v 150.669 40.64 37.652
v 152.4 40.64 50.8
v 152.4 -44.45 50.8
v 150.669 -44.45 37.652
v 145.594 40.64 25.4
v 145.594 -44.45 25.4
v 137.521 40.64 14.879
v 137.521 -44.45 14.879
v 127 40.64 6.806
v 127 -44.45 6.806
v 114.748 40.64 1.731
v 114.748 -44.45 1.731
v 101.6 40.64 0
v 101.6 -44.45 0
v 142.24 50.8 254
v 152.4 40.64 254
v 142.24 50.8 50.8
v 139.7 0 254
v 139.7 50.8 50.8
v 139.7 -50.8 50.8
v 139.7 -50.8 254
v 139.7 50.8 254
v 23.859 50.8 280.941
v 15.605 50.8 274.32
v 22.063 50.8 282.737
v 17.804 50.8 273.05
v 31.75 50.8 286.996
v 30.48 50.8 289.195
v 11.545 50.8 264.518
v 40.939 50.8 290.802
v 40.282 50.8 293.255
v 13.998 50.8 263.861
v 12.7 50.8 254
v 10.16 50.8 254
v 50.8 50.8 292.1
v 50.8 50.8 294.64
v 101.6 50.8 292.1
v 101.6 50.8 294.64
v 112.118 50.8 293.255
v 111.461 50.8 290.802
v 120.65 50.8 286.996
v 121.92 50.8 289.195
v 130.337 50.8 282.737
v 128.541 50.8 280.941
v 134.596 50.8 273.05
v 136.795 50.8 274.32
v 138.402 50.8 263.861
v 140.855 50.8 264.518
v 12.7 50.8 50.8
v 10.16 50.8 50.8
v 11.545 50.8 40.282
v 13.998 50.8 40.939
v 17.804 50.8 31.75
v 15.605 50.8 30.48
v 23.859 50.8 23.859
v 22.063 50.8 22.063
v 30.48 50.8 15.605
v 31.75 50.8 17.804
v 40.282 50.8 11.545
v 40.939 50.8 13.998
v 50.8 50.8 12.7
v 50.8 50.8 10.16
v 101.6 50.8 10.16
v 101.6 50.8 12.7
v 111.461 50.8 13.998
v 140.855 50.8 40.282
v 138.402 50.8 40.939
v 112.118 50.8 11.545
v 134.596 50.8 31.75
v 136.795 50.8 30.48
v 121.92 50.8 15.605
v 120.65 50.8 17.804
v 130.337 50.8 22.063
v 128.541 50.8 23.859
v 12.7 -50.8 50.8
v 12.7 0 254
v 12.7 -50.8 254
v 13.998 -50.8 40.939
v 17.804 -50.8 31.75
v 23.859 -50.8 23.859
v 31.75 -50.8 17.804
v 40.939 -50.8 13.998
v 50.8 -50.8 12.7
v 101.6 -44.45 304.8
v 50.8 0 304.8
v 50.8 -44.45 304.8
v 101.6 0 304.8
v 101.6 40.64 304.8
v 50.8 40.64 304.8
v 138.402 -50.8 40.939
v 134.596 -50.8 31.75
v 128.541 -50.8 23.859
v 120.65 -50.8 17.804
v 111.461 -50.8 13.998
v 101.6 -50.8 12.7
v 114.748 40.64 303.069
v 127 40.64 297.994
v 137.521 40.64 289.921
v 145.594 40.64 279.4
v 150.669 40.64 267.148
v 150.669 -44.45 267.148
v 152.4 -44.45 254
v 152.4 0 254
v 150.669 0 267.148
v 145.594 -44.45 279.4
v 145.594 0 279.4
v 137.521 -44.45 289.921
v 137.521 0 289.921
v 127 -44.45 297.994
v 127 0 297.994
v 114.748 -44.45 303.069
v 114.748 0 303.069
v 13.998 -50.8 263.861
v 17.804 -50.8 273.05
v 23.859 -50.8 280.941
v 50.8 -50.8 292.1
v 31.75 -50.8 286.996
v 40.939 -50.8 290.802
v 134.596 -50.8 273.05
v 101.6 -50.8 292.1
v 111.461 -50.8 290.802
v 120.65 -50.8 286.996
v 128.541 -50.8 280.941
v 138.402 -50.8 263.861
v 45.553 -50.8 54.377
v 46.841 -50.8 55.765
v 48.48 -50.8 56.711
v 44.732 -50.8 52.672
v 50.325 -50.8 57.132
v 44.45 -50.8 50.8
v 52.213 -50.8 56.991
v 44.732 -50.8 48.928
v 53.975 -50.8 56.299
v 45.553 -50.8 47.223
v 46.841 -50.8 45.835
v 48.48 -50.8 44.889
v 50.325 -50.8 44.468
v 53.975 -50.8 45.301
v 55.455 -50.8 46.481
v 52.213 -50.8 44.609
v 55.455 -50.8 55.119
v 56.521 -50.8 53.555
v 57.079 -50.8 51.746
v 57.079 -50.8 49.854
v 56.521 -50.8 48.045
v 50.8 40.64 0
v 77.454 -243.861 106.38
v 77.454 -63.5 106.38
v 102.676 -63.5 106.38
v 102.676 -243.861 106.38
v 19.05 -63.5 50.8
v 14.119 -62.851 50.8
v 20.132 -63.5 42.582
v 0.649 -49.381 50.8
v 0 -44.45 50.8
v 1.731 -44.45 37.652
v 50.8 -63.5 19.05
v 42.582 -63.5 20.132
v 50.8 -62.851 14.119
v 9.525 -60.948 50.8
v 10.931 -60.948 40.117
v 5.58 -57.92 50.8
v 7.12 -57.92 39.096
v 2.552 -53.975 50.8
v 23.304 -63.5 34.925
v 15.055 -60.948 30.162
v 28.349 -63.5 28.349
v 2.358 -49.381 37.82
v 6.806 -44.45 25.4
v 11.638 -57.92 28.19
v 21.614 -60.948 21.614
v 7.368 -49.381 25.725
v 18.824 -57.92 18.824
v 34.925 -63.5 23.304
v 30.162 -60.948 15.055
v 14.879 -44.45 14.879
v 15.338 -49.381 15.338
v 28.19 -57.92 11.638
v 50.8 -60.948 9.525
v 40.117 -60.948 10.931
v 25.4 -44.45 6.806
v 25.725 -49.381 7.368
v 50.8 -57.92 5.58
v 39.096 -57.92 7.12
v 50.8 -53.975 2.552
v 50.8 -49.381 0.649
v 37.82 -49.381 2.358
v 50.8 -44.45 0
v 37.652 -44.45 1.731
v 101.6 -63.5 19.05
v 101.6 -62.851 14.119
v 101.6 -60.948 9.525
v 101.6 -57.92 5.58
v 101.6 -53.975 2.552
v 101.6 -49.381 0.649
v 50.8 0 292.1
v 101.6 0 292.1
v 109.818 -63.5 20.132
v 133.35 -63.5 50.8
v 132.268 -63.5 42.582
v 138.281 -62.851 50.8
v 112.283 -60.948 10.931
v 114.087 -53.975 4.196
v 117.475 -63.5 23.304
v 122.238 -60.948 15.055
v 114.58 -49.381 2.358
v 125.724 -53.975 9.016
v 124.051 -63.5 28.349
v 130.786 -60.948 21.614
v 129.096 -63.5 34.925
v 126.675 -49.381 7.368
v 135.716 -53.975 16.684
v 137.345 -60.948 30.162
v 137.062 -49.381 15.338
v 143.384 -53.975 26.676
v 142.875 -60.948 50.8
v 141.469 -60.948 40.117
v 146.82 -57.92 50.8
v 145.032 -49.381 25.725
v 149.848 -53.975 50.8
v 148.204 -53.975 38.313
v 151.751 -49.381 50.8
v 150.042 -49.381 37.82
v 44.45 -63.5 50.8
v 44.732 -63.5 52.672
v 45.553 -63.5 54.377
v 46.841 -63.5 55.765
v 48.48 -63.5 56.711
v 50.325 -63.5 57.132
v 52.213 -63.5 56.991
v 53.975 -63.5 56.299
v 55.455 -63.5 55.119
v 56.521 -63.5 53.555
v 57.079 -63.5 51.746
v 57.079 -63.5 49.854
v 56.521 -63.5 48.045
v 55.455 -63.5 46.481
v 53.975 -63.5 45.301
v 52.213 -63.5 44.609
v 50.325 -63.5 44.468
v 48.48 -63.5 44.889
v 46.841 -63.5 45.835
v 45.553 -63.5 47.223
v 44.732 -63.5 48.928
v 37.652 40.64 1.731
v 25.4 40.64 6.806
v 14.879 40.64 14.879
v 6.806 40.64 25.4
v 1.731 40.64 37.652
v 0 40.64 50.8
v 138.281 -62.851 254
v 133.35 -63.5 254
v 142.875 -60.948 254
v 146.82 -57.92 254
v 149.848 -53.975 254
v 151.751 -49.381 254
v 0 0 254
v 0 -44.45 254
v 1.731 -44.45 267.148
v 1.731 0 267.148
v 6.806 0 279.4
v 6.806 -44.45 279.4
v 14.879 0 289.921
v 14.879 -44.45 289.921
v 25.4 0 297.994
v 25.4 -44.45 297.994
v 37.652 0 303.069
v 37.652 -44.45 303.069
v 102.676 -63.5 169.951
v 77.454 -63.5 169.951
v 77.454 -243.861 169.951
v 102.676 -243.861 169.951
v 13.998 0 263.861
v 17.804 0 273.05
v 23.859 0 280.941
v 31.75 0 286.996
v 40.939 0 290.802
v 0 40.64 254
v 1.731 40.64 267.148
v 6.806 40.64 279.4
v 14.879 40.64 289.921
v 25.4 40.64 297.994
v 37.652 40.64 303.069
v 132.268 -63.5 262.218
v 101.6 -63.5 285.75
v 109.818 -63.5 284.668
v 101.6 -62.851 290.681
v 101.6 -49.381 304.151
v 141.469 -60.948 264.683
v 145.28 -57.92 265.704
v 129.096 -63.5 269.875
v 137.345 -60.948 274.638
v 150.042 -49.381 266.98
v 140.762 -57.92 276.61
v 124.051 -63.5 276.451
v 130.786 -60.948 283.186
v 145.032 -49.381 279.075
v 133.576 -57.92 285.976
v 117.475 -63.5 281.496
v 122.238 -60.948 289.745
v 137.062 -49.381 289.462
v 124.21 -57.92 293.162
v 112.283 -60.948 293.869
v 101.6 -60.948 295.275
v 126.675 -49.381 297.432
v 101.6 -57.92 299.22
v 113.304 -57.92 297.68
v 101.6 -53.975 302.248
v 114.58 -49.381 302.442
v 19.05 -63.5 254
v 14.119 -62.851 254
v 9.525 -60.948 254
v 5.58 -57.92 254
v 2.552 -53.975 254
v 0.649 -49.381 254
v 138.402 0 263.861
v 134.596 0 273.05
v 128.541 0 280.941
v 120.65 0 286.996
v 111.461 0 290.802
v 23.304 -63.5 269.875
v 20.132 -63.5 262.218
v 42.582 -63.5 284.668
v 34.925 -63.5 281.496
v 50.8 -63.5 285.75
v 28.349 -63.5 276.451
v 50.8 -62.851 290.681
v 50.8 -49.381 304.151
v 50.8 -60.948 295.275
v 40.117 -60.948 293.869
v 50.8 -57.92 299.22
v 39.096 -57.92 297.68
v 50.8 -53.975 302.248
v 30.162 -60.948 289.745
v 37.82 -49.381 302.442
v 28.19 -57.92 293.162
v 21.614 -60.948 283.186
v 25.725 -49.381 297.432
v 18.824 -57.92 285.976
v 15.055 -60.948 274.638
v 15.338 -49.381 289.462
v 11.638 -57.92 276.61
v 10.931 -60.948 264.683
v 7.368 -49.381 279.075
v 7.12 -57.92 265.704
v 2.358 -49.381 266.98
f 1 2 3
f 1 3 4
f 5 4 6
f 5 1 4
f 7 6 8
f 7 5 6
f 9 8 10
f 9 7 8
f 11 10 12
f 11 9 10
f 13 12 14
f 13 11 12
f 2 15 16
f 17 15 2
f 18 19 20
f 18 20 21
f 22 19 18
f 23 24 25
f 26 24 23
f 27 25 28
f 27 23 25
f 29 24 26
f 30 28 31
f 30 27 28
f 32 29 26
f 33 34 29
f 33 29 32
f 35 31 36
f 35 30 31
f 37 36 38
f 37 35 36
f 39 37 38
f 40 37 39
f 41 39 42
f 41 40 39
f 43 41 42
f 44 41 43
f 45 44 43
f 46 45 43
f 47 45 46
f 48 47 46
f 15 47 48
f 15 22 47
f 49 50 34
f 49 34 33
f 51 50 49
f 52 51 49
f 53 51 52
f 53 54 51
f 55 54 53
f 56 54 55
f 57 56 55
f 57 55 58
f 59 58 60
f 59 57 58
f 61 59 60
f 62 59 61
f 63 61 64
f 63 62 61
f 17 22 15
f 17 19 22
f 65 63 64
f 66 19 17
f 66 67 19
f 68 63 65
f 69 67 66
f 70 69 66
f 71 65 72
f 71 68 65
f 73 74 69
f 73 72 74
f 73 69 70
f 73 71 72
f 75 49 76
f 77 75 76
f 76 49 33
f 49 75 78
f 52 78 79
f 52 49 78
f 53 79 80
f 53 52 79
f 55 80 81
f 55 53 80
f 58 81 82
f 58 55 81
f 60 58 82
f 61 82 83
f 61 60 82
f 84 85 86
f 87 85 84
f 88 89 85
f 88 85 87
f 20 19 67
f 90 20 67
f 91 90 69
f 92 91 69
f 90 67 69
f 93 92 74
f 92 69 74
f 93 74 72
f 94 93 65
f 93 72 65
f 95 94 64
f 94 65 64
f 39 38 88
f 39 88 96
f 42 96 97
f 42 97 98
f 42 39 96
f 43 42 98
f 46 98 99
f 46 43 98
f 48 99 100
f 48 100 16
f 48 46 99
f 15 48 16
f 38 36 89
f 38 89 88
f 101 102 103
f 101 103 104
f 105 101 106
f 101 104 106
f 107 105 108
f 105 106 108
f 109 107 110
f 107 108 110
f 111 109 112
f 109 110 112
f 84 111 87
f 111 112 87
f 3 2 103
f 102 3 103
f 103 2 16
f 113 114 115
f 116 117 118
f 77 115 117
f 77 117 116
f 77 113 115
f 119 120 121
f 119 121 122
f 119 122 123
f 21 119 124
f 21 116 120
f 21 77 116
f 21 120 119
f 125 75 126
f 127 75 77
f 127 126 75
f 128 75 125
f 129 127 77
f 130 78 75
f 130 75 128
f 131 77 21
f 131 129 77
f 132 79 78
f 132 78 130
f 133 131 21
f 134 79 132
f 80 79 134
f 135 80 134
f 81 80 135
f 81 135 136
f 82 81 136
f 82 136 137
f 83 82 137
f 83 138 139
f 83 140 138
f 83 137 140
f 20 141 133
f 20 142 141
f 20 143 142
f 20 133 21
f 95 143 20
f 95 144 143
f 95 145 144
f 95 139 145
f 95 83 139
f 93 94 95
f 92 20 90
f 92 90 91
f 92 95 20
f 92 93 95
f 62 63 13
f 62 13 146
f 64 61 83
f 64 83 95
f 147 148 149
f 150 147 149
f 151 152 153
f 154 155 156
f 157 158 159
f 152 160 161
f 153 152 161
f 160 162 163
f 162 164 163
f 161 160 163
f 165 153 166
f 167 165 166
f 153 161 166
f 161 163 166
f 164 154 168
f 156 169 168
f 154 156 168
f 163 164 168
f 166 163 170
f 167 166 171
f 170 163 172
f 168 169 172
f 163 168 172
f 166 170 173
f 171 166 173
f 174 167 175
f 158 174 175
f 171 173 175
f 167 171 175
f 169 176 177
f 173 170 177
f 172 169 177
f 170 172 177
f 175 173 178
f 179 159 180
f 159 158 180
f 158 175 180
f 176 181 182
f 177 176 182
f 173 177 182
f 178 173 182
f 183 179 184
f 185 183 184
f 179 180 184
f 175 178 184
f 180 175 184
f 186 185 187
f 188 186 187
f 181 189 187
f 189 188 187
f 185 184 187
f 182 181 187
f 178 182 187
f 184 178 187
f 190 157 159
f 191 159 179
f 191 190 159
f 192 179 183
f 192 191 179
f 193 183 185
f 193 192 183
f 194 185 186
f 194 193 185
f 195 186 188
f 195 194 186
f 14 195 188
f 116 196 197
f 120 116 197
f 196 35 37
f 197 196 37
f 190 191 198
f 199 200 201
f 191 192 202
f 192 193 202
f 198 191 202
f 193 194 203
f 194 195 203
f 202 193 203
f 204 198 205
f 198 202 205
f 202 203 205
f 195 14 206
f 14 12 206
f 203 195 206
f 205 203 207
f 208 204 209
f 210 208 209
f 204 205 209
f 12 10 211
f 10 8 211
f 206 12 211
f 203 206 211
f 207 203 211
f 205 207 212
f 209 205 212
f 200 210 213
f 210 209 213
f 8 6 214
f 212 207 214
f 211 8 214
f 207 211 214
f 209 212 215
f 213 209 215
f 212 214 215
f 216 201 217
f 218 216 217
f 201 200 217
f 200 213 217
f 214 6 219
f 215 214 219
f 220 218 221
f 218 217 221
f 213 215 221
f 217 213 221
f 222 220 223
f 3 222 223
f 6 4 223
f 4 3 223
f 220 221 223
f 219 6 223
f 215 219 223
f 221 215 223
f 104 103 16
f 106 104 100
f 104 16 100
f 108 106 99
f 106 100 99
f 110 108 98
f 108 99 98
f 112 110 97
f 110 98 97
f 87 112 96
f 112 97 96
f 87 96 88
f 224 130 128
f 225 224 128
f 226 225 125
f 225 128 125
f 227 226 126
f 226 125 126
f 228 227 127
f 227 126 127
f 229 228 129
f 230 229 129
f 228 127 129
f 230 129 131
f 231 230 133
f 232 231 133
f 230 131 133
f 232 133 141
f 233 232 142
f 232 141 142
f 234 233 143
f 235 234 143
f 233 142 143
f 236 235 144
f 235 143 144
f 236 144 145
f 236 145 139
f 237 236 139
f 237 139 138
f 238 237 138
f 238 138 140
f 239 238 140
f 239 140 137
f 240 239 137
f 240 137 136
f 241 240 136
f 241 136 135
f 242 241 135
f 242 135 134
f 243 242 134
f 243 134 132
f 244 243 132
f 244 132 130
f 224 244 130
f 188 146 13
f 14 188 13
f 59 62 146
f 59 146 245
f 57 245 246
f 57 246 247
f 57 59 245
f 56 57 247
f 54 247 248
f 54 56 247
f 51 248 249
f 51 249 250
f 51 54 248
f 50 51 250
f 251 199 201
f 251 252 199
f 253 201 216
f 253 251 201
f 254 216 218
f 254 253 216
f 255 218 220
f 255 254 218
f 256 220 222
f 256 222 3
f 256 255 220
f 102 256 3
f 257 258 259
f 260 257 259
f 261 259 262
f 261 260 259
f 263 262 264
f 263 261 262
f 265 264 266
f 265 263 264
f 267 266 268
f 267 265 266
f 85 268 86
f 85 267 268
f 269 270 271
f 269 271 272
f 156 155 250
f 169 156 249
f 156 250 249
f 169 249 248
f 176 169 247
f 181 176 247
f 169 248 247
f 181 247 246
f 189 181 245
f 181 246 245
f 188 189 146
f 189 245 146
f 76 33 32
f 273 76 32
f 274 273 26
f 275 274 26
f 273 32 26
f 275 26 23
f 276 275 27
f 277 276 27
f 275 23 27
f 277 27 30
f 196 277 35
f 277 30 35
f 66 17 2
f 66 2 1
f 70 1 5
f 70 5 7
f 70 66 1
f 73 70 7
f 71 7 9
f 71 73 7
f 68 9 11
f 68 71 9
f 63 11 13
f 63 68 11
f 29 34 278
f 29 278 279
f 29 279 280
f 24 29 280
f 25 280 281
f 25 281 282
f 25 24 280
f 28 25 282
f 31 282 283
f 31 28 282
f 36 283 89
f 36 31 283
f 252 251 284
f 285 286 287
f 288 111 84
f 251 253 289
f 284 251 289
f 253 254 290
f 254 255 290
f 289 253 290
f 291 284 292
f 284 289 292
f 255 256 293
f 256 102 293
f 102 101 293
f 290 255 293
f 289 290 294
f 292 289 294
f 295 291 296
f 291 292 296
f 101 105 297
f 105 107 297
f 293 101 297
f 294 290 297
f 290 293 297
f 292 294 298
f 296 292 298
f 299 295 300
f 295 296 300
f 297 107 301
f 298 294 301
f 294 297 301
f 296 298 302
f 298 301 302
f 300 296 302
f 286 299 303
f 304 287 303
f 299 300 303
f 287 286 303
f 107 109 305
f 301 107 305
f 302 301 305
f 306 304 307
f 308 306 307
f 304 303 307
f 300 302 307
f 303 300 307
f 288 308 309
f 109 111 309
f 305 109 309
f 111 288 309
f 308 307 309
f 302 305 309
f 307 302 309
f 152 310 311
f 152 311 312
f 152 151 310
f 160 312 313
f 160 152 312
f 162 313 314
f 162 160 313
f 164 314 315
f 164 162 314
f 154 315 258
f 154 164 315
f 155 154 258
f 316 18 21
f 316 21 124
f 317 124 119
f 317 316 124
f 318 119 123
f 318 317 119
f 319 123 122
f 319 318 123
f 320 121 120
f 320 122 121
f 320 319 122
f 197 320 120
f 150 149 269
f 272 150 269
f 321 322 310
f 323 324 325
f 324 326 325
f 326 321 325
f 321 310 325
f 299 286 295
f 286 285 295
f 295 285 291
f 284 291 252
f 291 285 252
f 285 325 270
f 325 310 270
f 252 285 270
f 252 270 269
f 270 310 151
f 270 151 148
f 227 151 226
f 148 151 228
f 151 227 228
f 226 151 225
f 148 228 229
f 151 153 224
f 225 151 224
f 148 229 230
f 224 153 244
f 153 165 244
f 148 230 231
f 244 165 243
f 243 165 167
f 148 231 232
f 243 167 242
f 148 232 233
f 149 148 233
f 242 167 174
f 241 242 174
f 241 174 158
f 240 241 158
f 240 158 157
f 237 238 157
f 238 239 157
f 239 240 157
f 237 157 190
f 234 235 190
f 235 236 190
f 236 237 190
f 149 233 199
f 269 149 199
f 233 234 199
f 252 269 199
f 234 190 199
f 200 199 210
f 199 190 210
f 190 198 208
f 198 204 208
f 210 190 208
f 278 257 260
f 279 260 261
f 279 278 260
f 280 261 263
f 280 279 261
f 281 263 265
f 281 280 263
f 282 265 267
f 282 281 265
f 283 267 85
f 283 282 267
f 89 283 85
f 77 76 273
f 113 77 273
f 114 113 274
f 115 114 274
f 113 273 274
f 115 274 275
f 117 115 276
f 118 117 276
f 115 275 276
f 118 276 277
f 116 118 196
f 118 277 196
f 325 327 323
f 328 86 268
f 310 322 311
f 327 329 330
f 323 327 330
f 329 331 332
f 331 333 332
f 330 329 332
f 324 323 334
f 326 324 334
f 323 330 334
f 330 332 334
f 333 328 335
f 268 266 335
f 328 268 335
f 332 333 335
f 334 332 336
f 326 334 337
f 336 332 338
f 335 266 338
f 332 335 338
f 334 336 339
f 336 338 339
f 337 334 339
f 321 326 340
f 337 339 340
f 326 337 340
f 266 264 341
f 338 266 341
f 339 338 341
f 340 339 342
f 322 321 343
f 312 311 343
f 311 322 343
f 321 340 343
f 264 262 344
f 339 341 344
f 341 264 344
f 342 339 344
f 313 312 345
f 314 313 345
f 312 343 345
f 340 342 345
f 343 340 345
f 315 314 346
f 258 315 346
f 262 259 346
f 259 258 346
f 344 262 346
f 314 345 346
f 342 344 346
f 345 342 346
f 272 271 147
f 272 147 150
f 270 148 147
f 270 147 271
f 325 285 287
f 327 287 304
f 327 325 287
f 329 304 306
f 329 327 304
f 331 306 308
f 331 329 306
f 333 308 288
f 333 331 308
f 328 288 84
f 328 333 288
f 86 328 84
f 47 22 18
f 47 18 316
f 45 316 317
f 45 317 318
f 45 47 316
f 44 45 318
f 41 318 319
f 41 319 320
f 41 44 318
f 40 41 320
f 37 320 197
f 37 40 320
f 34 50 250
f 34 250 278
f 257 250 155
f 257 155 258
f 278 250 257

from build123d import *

# Parameters (mm, degrees)
F0_W      = 152.4
F0_H      = 50.8
F1_DEPTH  = 304.8
F2_R      = 50.8
F3_DEPTH  = 63.5
F4_T      = -12.7
F9_SIZE   = 10.16
F10_R     = 6.35
F5_DEPTH  = 114.301
F7_R      = 19.05
F6_W      = 25.2215266228
F6_H      = 63.5711848736
F11_DEPTH = 180.3614813834


# Not quite as in the source:
# - a feature names something its author has since deleted; it is built from what else it names


with BuildPart() as f1:
    # F0 (on Top) → F1 (new body)
    with BuildSketch(Plane.XY):
        with Locations((76.2, 25.4)):
            Rectangle(F0_W, F0_H)
    extrude(amount=F1_DEPTH)

    # F2
    f2_edges = [f1.edges().sort_by_distance(p)[0] for p in [
        (152.4, 25.4, 304.8),
        (152.4, 25.4, 0),
        (0, 25.4, 304.8),
        (0, 25.4, 0),
    ]]
    fillet(f2_edges, radius=F2_R)

    # F3 (add): a face of the model
    f3_faces = [f1.faces().sort_by_distance(p)[0] for p in [
        (76.2, 0, 152.4),
    ]]
    extrude(f3_faces, amount=F3_DEPTH)

    # F4
    f4_openings = [f1.faces().sort_by_distance(p)[0] for p in [
        (76.2, 50.8, 152.4),
    ]]
    offset(amount=F4_T, openings=f4_openings)

    # F9
    f9_edges = [f1.edges().sort_by_distance(p)[0] for p in [
        (0, 50.8, 152.4),
        (14.878976, 50.8, 14.878976),
        (137.521024, 50.8, 14.878976),
        (152.4, 50.8, 152.4),
        (137.521024, 50.8, 289.921024),
        (76.2, 50.8, 304.8),
        (76.2, 50.8, 0),
        (14.878976, 50.8, 289.921024),
    ]]
    chamfer(f9_edges, length=F9_SIZE)

    # F10 (on face) → F5 (cut, through all)
    with BuildSketch(Plane(origin=(0, 50.8, 0), x_dir=(-1, 0, 0), z_dir=(0, 1, 0))):
        with Locations((-50.8, 50.8)):
            Circle(F10_R)
    extrude(amount=-F5_DEPTH, mode=Mode.SUBTRACT)

    # F7
    f7_edges = [f1.edges().sort_by_distance(p)[0] for p in [
        (152.4, -63.5, 152.4),
        (0, -63.5, 152.4),
        (14.878976, -63.5, 289.921024),
        (14.878976, -63.5, 14.878976),
        (76.2, -63.5, 0),
        (76.2, -63.5, 304.8),
        (137.521024, -63.5, 14.878976),
        (137.521024, -63.5, 289.921024),
    ]]
    fillet(f7_edges, radius=F7_R)

    # F6 (on face) → F11 (join)
    with BuildSketch(Plane.XZ.offset(63.5)):
        with Locations((90.0648534298, 138.1654888391)):
            Rectangle(F6_W, F6_H)
    extrude(amount=F11_DEPTH)


solid = f1.part
